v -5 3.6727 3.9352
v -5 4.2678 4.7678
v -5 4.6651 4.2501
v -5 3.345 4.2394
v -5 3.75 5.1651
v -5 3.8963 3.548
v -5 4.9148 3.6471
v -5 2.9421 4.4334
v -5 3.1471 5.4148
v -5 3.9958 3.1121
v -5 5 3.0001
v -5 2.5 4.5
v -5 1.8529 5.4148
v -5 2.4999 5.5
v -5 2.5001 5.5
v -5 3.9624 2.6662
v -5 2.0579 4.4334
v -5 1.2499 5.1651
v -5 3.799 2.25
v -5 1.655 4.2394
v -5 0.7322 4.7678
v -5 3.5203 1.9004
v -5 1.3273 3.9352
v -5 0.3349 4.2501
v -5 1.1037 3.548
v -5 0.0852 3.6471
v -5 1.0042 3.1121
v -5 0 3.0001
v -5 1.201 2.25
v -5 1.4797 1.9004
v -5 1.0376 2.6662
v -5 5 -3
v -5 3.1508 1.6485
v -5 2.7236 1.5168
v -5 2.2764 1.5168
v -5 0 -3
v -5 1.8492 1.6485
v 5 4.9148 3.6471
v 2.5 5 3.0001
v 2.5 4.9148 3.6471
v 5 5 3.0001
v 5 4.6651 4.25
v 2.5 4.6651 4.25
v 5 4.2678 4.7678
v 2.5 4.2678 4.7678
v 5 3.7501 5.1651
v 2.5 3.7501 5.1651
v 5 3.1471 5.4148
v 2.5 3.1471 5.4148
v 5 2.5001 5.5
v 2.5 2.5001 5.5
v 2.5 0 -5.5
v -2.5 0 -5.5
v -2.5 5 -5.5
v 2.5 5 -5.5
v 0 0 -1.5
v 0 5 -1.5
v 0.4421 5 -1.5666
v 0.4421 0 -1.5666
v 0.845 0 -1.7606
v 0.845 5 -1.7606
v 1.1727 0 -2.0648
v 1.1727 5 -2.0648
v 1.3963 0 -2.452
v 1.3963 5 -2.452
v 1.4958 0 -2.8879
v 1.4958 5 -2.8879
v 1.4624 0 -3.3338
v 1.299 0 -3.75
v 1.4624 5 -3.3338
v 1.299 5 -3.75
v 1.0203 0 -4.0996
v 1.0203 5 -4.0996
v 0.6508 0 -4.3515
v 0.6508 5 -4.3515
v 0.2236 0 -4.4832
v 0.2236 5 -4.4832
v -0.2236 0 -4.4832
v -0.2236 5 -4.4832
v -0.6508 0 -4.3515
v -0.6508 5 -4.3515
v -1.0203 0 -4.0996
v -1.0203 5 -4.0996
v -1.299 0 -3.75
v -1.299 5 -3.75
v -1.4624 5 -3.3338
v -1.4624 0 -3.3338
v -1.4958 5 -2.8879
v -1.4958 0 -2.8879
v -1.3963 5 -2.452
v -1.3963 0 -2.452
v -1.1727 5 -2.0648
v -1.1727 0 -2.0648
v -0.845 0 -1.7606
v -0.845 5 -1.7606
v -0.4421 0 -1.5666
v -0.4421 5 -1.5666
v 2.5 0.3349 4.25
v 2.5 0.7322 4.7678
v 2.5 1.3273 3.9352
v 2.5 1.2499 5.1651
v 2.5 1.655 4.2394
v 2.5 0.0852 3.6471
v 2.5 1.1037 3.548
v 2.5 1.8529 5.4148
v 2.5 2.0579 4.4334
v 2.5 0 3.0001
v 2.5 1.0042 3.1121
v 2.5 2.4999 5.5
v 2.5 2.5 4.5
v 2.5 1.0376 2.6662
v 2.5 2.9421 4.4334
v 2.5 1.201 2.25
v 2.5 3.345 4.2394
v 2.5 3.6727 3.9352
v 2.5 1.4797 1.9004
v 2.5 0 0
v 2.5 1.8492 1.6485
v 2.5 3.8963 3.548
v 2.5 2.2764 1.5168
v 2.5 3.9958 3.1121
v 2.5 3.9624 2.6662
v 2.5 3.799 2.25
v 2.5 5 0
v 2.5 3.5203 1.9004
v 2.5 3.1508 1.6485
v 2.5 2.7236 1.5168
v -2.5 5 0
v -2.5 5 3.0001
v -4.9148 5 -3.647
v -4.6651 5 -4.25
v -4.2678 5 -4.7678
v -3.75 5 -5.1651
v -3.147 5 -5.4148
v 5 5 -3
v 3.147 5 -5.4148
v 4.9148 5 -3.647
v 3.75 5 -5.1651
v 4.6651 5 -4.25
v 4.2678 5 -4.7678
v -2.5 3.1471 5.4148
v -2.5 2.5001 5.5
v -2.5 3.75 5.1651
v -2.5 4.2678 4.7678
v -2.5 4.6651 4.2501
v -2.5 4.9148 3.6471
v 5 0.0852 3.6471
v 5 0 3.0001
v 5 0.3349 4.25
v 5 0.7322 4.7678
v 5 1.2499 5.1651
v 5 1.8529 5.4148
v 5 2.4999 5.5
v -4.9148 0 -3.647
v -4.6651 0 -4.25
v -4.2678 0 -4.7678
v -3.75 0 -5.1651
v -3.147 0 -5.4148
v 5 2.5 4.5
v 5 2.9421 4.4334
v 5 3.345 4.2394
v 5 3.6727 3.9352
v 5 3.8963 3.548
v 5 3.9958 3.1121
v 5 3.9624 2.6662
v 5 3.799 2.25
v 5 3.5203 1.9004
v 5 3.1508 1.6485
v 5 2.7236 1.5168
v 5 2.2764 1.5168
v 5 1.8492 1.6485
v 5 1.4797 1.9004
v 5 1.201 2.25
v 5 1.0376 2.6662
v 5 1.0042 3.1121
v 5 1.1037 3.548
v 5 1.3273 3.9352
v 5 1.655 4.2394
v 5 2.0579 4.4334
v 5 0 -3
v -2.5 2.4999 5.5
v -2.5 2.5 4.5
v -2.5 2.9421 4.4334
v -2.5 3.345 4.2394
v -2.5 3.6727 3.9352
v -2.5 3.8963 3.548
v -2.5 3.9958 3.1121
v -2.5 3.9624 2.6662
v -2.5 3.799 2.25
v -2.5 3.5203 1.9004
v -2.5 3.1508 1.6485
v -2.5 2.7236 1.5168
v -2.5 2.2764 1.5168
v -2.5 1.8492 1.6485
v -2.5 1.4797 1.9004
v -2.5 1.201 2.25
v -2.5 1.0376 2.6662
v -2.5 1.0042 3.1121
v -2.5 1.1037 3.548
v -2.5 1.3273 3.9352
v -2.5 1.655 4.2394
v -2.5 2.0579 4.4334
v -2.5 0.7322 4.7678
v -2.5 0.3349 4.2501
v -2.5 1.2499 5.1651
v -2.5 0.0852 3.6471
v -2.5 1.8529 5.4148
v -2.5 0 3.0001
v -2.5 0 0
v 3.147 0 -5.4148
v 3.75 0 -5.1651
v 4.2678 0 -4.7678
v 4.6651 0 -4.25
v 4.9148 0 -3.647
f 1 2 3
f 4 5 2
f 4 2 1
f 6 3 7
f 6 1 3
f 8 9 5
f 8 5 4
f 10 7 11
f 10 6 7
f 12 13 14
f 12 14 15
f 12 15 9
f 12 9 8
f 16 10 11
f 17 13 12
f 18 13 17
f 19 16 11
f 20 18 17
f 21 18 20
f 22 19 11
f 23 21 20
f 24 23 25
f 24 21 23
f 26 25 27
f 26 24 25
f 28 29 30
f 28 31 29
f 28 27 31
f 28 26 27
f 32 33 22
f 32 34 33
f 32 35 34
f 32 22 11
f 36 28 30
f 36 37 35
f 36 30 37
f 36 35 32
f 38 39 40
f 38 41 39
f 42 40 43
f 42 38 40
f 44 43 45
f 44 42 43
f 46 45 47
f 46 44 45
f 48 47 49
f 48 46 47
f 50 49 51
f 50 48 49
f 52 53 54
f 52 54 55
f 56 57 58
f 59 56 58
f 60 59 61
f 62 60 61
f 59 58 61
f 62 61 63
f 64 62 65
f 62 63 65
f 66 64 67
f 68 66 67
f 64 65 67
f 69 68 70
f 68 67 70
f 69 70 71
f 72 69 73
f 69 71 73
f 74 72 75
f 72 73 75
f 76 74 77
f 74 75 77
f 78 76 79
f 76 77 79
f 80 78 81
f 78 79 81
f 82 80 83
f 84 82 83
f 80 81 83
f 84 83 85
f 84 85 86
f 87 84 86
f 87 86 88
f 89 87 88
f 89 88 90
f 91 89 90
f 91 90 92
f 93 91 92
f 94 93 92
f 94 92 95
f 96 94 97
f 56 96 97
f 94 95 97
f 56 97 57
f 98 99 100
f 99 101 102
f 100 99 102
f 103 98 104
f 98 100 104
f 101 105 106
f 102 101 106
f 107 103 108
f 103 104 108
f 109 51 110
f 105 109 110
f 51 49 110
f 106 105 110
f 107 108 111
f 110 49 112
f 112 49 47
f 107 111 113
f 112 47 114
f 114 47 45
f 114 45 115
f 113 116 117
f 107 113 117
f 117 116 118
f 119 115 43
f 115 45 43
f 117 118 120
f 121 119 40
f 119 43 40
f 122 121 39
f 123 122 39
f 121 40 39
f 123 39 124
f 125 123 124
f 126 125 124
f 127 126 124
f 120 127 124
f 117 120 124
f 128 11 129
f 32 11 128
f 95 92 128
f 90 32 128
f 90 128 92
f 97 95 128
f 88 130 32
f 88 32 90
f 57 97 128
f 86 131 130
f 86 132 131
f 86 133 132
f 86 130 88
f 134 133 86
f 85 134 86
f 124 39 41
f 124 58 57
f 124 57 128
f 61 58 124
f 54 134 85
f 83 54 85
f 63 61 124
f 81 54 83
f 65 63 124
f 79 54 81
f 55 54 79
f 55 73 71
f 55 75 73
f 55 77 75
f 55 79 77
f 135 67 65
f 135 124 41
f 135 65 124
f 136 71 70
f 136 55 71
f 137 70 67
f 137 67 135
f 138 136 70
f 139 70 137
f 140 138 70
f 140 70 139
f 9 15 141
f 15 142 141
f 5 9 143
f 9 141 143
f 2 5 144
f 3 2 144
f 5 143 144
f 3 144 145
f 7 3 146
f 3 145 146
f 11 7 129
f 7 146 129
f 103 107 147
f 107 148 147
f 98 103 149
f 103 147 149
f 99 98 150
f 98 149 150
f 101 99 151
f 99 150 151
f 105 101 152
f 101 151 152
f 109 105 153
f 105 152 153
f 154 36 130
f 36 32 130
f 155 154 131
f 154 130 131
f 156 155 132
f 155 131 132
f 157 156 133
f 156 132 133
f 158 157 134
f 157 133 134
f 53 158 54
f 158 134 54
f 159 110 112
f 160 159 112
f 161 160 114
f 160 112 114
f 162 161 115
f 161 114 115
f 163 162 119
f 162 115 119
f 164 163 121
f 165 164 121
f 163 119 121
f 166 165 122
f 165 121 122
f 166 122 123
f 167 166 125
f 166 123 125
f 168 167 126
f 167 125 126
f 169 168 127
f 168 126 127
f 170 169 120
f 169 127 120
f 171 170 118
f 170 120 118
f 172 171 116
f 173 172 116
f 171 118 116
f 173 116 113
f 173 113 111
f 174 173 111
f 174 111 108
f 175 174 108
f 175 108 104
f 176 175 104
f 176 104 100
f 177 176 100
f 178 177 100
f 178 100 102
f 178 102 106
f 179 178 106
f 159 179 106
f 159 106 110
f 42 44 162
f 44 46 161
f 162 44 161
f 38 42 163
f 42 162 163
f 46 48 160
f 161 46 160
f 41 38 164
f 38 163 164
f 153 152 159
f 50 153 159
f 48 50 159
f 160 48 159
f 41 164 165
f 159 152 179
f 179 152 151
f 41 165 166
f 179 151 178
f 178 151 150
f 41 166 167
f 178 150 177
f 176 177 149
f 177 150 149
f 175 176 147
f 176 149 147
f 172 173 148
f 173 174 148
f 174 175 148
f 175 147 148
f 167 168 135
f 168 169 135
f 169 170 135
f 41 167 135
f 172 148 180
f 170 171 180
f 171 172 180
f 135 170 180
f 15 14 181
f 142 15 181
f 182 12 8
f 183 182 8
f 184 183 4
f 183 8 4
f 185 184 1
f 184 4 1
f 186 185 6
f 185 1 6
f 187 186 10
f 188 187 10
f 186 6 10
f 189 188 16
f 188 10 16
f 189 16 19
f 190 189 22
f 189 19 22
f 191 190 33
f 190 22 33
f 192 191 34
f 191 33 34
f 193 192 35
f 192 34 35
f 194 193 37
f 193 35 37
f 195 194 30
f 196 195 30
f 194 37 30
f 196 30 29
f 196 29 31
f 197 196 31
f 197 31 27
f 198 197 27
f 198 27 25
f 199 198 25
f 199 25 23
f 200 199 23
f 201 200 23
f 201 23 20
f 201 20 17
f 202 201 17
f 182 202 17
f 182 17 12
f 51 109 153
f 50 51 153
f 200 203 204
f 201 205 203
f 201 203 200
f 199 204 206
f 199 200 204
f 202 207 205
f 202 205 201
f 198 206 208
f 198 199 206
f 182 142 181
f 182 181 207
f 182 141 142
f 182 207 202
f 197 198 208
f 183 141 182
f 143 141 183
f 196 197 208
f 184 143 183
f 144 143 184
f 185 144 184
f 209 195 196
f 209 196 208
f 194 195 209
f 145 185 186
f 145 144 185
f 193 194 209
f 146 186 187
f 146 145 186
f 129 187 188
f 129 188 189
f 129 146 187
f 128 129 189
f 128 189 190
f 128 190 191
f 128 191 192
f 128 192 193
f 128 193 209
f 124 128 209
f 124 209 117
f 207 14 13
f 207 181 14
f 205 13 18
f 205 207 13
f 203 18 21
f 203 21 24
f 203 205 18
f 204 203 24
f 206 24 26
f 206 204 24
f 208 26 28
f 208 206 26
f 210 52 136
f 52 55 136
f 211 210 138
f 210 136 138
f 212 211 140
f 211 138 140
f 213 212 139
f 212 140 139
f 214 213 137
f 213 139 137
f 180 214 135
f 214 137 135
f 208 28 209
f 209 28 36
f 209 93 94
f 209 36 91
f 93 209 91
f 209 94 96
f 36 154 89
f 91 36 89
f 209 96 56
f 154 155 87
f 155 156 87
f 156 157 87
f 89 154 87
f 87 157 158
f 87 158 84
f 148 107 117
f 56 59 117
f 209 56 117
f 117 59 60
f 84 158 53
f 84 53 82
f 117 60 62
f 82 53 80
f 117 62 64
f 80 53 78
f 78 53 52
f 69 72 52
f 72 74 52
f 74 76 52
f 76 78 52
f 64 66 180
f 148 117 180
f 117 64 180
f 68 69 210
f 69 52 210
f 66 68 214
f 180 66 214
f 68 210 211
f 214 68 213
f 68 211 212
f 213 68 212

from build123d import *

# Parameters (mm, degrees)
SKETCH1_W           = 10
SKETCH1_H           = 11
BOSS_EXTRUDE1_DEPTH = 5
SKETCH3_W           = 5
SKETCH3_H           = 5.5
CUT_EXTRUDE1_DEPTH  = 5
SKETCH4_R           = 1.5
CUT_EXTRUDE2_DEPTH  = 5
SKETCH5_R           = 1.5
CUT_EXTRUDE3_DEPTH  = 10
FILLET1_R           = 2.5
FILLET2_R           = 2.5


with BuildPart() as part:
    # Sketch1 → Boss-Extrude1 (new body)
    with BuildSketch(Plane(origin=(0, 0, 0), x_dir=(1, 0, 0), z_dir=(0, 1, 0))):
        Rectangle(SKETCH1_W, SKETCH1_H)
    extrude(amount=BOSS_EXTRUDE1_DEPTH)

    # Sketch3 → Cut-Extrude1 (cut)
    with BuildSketch(Plane(origin=(0, 5, 0), x_dir=(1, 0, 0), z_dir=(0, 1, 0))):
        with Locations((0, -2.75)):
            Rectangle(SKETCH3_W, SKETCH3_H)
    extrude(amount=-CUT_EXTRUDE1_DEPTH, mode=Mode.SUBTRACT)

    # Sketch4 → Cut-Extrude2 (cut)
    with BuildSketch(Plane(origin=(0, 5, 0), x_dir=(1, 0, 0), z_dir=(0, 1, 0))):
        with Locations(Location((0, 3, 0), (0, 0, 270))):
            Circle(SKETCH4_R)
    extrude(amount=-CUT_EXTRUDE2_DEPTH, mode=Mode.SUBTRACT)

    # Sketch5 → Cut-Extrude3 (cut)
    with BuildSketch(Plane.ZY.offset(5)):
        with Locations((3, 2.5)):
            Circle(SKETCH5_R)
    extrude(amount=-CUT_EXTRUDE3_DEPTH, mode=Mode.SUBTRACT)

    # Fillet1
    fillet1_edges = [part.edges().sort_by_distance(p)[0] for p in [
        (3.75, 0, 5.5),
        (3.75, 5, 5.5),
        (-3.75, 0, 5.5),
        (-3.75, 5, 5.5),
    ]]
    fillet(fillet1_edges, radius=FILLET1_R - 0.0001)  # a hair under: the kernel refuses the full size

    # Fillet2
    fillet2_edges = [part.edges().sort_by_distance(p)[0] for p in [
        (-5, 2.5, -5.5),
        (5, 2.5, -5.5),
    ]]
    fillet(fillet2_edges, radius=FILLET2_R)


solid = part.part
